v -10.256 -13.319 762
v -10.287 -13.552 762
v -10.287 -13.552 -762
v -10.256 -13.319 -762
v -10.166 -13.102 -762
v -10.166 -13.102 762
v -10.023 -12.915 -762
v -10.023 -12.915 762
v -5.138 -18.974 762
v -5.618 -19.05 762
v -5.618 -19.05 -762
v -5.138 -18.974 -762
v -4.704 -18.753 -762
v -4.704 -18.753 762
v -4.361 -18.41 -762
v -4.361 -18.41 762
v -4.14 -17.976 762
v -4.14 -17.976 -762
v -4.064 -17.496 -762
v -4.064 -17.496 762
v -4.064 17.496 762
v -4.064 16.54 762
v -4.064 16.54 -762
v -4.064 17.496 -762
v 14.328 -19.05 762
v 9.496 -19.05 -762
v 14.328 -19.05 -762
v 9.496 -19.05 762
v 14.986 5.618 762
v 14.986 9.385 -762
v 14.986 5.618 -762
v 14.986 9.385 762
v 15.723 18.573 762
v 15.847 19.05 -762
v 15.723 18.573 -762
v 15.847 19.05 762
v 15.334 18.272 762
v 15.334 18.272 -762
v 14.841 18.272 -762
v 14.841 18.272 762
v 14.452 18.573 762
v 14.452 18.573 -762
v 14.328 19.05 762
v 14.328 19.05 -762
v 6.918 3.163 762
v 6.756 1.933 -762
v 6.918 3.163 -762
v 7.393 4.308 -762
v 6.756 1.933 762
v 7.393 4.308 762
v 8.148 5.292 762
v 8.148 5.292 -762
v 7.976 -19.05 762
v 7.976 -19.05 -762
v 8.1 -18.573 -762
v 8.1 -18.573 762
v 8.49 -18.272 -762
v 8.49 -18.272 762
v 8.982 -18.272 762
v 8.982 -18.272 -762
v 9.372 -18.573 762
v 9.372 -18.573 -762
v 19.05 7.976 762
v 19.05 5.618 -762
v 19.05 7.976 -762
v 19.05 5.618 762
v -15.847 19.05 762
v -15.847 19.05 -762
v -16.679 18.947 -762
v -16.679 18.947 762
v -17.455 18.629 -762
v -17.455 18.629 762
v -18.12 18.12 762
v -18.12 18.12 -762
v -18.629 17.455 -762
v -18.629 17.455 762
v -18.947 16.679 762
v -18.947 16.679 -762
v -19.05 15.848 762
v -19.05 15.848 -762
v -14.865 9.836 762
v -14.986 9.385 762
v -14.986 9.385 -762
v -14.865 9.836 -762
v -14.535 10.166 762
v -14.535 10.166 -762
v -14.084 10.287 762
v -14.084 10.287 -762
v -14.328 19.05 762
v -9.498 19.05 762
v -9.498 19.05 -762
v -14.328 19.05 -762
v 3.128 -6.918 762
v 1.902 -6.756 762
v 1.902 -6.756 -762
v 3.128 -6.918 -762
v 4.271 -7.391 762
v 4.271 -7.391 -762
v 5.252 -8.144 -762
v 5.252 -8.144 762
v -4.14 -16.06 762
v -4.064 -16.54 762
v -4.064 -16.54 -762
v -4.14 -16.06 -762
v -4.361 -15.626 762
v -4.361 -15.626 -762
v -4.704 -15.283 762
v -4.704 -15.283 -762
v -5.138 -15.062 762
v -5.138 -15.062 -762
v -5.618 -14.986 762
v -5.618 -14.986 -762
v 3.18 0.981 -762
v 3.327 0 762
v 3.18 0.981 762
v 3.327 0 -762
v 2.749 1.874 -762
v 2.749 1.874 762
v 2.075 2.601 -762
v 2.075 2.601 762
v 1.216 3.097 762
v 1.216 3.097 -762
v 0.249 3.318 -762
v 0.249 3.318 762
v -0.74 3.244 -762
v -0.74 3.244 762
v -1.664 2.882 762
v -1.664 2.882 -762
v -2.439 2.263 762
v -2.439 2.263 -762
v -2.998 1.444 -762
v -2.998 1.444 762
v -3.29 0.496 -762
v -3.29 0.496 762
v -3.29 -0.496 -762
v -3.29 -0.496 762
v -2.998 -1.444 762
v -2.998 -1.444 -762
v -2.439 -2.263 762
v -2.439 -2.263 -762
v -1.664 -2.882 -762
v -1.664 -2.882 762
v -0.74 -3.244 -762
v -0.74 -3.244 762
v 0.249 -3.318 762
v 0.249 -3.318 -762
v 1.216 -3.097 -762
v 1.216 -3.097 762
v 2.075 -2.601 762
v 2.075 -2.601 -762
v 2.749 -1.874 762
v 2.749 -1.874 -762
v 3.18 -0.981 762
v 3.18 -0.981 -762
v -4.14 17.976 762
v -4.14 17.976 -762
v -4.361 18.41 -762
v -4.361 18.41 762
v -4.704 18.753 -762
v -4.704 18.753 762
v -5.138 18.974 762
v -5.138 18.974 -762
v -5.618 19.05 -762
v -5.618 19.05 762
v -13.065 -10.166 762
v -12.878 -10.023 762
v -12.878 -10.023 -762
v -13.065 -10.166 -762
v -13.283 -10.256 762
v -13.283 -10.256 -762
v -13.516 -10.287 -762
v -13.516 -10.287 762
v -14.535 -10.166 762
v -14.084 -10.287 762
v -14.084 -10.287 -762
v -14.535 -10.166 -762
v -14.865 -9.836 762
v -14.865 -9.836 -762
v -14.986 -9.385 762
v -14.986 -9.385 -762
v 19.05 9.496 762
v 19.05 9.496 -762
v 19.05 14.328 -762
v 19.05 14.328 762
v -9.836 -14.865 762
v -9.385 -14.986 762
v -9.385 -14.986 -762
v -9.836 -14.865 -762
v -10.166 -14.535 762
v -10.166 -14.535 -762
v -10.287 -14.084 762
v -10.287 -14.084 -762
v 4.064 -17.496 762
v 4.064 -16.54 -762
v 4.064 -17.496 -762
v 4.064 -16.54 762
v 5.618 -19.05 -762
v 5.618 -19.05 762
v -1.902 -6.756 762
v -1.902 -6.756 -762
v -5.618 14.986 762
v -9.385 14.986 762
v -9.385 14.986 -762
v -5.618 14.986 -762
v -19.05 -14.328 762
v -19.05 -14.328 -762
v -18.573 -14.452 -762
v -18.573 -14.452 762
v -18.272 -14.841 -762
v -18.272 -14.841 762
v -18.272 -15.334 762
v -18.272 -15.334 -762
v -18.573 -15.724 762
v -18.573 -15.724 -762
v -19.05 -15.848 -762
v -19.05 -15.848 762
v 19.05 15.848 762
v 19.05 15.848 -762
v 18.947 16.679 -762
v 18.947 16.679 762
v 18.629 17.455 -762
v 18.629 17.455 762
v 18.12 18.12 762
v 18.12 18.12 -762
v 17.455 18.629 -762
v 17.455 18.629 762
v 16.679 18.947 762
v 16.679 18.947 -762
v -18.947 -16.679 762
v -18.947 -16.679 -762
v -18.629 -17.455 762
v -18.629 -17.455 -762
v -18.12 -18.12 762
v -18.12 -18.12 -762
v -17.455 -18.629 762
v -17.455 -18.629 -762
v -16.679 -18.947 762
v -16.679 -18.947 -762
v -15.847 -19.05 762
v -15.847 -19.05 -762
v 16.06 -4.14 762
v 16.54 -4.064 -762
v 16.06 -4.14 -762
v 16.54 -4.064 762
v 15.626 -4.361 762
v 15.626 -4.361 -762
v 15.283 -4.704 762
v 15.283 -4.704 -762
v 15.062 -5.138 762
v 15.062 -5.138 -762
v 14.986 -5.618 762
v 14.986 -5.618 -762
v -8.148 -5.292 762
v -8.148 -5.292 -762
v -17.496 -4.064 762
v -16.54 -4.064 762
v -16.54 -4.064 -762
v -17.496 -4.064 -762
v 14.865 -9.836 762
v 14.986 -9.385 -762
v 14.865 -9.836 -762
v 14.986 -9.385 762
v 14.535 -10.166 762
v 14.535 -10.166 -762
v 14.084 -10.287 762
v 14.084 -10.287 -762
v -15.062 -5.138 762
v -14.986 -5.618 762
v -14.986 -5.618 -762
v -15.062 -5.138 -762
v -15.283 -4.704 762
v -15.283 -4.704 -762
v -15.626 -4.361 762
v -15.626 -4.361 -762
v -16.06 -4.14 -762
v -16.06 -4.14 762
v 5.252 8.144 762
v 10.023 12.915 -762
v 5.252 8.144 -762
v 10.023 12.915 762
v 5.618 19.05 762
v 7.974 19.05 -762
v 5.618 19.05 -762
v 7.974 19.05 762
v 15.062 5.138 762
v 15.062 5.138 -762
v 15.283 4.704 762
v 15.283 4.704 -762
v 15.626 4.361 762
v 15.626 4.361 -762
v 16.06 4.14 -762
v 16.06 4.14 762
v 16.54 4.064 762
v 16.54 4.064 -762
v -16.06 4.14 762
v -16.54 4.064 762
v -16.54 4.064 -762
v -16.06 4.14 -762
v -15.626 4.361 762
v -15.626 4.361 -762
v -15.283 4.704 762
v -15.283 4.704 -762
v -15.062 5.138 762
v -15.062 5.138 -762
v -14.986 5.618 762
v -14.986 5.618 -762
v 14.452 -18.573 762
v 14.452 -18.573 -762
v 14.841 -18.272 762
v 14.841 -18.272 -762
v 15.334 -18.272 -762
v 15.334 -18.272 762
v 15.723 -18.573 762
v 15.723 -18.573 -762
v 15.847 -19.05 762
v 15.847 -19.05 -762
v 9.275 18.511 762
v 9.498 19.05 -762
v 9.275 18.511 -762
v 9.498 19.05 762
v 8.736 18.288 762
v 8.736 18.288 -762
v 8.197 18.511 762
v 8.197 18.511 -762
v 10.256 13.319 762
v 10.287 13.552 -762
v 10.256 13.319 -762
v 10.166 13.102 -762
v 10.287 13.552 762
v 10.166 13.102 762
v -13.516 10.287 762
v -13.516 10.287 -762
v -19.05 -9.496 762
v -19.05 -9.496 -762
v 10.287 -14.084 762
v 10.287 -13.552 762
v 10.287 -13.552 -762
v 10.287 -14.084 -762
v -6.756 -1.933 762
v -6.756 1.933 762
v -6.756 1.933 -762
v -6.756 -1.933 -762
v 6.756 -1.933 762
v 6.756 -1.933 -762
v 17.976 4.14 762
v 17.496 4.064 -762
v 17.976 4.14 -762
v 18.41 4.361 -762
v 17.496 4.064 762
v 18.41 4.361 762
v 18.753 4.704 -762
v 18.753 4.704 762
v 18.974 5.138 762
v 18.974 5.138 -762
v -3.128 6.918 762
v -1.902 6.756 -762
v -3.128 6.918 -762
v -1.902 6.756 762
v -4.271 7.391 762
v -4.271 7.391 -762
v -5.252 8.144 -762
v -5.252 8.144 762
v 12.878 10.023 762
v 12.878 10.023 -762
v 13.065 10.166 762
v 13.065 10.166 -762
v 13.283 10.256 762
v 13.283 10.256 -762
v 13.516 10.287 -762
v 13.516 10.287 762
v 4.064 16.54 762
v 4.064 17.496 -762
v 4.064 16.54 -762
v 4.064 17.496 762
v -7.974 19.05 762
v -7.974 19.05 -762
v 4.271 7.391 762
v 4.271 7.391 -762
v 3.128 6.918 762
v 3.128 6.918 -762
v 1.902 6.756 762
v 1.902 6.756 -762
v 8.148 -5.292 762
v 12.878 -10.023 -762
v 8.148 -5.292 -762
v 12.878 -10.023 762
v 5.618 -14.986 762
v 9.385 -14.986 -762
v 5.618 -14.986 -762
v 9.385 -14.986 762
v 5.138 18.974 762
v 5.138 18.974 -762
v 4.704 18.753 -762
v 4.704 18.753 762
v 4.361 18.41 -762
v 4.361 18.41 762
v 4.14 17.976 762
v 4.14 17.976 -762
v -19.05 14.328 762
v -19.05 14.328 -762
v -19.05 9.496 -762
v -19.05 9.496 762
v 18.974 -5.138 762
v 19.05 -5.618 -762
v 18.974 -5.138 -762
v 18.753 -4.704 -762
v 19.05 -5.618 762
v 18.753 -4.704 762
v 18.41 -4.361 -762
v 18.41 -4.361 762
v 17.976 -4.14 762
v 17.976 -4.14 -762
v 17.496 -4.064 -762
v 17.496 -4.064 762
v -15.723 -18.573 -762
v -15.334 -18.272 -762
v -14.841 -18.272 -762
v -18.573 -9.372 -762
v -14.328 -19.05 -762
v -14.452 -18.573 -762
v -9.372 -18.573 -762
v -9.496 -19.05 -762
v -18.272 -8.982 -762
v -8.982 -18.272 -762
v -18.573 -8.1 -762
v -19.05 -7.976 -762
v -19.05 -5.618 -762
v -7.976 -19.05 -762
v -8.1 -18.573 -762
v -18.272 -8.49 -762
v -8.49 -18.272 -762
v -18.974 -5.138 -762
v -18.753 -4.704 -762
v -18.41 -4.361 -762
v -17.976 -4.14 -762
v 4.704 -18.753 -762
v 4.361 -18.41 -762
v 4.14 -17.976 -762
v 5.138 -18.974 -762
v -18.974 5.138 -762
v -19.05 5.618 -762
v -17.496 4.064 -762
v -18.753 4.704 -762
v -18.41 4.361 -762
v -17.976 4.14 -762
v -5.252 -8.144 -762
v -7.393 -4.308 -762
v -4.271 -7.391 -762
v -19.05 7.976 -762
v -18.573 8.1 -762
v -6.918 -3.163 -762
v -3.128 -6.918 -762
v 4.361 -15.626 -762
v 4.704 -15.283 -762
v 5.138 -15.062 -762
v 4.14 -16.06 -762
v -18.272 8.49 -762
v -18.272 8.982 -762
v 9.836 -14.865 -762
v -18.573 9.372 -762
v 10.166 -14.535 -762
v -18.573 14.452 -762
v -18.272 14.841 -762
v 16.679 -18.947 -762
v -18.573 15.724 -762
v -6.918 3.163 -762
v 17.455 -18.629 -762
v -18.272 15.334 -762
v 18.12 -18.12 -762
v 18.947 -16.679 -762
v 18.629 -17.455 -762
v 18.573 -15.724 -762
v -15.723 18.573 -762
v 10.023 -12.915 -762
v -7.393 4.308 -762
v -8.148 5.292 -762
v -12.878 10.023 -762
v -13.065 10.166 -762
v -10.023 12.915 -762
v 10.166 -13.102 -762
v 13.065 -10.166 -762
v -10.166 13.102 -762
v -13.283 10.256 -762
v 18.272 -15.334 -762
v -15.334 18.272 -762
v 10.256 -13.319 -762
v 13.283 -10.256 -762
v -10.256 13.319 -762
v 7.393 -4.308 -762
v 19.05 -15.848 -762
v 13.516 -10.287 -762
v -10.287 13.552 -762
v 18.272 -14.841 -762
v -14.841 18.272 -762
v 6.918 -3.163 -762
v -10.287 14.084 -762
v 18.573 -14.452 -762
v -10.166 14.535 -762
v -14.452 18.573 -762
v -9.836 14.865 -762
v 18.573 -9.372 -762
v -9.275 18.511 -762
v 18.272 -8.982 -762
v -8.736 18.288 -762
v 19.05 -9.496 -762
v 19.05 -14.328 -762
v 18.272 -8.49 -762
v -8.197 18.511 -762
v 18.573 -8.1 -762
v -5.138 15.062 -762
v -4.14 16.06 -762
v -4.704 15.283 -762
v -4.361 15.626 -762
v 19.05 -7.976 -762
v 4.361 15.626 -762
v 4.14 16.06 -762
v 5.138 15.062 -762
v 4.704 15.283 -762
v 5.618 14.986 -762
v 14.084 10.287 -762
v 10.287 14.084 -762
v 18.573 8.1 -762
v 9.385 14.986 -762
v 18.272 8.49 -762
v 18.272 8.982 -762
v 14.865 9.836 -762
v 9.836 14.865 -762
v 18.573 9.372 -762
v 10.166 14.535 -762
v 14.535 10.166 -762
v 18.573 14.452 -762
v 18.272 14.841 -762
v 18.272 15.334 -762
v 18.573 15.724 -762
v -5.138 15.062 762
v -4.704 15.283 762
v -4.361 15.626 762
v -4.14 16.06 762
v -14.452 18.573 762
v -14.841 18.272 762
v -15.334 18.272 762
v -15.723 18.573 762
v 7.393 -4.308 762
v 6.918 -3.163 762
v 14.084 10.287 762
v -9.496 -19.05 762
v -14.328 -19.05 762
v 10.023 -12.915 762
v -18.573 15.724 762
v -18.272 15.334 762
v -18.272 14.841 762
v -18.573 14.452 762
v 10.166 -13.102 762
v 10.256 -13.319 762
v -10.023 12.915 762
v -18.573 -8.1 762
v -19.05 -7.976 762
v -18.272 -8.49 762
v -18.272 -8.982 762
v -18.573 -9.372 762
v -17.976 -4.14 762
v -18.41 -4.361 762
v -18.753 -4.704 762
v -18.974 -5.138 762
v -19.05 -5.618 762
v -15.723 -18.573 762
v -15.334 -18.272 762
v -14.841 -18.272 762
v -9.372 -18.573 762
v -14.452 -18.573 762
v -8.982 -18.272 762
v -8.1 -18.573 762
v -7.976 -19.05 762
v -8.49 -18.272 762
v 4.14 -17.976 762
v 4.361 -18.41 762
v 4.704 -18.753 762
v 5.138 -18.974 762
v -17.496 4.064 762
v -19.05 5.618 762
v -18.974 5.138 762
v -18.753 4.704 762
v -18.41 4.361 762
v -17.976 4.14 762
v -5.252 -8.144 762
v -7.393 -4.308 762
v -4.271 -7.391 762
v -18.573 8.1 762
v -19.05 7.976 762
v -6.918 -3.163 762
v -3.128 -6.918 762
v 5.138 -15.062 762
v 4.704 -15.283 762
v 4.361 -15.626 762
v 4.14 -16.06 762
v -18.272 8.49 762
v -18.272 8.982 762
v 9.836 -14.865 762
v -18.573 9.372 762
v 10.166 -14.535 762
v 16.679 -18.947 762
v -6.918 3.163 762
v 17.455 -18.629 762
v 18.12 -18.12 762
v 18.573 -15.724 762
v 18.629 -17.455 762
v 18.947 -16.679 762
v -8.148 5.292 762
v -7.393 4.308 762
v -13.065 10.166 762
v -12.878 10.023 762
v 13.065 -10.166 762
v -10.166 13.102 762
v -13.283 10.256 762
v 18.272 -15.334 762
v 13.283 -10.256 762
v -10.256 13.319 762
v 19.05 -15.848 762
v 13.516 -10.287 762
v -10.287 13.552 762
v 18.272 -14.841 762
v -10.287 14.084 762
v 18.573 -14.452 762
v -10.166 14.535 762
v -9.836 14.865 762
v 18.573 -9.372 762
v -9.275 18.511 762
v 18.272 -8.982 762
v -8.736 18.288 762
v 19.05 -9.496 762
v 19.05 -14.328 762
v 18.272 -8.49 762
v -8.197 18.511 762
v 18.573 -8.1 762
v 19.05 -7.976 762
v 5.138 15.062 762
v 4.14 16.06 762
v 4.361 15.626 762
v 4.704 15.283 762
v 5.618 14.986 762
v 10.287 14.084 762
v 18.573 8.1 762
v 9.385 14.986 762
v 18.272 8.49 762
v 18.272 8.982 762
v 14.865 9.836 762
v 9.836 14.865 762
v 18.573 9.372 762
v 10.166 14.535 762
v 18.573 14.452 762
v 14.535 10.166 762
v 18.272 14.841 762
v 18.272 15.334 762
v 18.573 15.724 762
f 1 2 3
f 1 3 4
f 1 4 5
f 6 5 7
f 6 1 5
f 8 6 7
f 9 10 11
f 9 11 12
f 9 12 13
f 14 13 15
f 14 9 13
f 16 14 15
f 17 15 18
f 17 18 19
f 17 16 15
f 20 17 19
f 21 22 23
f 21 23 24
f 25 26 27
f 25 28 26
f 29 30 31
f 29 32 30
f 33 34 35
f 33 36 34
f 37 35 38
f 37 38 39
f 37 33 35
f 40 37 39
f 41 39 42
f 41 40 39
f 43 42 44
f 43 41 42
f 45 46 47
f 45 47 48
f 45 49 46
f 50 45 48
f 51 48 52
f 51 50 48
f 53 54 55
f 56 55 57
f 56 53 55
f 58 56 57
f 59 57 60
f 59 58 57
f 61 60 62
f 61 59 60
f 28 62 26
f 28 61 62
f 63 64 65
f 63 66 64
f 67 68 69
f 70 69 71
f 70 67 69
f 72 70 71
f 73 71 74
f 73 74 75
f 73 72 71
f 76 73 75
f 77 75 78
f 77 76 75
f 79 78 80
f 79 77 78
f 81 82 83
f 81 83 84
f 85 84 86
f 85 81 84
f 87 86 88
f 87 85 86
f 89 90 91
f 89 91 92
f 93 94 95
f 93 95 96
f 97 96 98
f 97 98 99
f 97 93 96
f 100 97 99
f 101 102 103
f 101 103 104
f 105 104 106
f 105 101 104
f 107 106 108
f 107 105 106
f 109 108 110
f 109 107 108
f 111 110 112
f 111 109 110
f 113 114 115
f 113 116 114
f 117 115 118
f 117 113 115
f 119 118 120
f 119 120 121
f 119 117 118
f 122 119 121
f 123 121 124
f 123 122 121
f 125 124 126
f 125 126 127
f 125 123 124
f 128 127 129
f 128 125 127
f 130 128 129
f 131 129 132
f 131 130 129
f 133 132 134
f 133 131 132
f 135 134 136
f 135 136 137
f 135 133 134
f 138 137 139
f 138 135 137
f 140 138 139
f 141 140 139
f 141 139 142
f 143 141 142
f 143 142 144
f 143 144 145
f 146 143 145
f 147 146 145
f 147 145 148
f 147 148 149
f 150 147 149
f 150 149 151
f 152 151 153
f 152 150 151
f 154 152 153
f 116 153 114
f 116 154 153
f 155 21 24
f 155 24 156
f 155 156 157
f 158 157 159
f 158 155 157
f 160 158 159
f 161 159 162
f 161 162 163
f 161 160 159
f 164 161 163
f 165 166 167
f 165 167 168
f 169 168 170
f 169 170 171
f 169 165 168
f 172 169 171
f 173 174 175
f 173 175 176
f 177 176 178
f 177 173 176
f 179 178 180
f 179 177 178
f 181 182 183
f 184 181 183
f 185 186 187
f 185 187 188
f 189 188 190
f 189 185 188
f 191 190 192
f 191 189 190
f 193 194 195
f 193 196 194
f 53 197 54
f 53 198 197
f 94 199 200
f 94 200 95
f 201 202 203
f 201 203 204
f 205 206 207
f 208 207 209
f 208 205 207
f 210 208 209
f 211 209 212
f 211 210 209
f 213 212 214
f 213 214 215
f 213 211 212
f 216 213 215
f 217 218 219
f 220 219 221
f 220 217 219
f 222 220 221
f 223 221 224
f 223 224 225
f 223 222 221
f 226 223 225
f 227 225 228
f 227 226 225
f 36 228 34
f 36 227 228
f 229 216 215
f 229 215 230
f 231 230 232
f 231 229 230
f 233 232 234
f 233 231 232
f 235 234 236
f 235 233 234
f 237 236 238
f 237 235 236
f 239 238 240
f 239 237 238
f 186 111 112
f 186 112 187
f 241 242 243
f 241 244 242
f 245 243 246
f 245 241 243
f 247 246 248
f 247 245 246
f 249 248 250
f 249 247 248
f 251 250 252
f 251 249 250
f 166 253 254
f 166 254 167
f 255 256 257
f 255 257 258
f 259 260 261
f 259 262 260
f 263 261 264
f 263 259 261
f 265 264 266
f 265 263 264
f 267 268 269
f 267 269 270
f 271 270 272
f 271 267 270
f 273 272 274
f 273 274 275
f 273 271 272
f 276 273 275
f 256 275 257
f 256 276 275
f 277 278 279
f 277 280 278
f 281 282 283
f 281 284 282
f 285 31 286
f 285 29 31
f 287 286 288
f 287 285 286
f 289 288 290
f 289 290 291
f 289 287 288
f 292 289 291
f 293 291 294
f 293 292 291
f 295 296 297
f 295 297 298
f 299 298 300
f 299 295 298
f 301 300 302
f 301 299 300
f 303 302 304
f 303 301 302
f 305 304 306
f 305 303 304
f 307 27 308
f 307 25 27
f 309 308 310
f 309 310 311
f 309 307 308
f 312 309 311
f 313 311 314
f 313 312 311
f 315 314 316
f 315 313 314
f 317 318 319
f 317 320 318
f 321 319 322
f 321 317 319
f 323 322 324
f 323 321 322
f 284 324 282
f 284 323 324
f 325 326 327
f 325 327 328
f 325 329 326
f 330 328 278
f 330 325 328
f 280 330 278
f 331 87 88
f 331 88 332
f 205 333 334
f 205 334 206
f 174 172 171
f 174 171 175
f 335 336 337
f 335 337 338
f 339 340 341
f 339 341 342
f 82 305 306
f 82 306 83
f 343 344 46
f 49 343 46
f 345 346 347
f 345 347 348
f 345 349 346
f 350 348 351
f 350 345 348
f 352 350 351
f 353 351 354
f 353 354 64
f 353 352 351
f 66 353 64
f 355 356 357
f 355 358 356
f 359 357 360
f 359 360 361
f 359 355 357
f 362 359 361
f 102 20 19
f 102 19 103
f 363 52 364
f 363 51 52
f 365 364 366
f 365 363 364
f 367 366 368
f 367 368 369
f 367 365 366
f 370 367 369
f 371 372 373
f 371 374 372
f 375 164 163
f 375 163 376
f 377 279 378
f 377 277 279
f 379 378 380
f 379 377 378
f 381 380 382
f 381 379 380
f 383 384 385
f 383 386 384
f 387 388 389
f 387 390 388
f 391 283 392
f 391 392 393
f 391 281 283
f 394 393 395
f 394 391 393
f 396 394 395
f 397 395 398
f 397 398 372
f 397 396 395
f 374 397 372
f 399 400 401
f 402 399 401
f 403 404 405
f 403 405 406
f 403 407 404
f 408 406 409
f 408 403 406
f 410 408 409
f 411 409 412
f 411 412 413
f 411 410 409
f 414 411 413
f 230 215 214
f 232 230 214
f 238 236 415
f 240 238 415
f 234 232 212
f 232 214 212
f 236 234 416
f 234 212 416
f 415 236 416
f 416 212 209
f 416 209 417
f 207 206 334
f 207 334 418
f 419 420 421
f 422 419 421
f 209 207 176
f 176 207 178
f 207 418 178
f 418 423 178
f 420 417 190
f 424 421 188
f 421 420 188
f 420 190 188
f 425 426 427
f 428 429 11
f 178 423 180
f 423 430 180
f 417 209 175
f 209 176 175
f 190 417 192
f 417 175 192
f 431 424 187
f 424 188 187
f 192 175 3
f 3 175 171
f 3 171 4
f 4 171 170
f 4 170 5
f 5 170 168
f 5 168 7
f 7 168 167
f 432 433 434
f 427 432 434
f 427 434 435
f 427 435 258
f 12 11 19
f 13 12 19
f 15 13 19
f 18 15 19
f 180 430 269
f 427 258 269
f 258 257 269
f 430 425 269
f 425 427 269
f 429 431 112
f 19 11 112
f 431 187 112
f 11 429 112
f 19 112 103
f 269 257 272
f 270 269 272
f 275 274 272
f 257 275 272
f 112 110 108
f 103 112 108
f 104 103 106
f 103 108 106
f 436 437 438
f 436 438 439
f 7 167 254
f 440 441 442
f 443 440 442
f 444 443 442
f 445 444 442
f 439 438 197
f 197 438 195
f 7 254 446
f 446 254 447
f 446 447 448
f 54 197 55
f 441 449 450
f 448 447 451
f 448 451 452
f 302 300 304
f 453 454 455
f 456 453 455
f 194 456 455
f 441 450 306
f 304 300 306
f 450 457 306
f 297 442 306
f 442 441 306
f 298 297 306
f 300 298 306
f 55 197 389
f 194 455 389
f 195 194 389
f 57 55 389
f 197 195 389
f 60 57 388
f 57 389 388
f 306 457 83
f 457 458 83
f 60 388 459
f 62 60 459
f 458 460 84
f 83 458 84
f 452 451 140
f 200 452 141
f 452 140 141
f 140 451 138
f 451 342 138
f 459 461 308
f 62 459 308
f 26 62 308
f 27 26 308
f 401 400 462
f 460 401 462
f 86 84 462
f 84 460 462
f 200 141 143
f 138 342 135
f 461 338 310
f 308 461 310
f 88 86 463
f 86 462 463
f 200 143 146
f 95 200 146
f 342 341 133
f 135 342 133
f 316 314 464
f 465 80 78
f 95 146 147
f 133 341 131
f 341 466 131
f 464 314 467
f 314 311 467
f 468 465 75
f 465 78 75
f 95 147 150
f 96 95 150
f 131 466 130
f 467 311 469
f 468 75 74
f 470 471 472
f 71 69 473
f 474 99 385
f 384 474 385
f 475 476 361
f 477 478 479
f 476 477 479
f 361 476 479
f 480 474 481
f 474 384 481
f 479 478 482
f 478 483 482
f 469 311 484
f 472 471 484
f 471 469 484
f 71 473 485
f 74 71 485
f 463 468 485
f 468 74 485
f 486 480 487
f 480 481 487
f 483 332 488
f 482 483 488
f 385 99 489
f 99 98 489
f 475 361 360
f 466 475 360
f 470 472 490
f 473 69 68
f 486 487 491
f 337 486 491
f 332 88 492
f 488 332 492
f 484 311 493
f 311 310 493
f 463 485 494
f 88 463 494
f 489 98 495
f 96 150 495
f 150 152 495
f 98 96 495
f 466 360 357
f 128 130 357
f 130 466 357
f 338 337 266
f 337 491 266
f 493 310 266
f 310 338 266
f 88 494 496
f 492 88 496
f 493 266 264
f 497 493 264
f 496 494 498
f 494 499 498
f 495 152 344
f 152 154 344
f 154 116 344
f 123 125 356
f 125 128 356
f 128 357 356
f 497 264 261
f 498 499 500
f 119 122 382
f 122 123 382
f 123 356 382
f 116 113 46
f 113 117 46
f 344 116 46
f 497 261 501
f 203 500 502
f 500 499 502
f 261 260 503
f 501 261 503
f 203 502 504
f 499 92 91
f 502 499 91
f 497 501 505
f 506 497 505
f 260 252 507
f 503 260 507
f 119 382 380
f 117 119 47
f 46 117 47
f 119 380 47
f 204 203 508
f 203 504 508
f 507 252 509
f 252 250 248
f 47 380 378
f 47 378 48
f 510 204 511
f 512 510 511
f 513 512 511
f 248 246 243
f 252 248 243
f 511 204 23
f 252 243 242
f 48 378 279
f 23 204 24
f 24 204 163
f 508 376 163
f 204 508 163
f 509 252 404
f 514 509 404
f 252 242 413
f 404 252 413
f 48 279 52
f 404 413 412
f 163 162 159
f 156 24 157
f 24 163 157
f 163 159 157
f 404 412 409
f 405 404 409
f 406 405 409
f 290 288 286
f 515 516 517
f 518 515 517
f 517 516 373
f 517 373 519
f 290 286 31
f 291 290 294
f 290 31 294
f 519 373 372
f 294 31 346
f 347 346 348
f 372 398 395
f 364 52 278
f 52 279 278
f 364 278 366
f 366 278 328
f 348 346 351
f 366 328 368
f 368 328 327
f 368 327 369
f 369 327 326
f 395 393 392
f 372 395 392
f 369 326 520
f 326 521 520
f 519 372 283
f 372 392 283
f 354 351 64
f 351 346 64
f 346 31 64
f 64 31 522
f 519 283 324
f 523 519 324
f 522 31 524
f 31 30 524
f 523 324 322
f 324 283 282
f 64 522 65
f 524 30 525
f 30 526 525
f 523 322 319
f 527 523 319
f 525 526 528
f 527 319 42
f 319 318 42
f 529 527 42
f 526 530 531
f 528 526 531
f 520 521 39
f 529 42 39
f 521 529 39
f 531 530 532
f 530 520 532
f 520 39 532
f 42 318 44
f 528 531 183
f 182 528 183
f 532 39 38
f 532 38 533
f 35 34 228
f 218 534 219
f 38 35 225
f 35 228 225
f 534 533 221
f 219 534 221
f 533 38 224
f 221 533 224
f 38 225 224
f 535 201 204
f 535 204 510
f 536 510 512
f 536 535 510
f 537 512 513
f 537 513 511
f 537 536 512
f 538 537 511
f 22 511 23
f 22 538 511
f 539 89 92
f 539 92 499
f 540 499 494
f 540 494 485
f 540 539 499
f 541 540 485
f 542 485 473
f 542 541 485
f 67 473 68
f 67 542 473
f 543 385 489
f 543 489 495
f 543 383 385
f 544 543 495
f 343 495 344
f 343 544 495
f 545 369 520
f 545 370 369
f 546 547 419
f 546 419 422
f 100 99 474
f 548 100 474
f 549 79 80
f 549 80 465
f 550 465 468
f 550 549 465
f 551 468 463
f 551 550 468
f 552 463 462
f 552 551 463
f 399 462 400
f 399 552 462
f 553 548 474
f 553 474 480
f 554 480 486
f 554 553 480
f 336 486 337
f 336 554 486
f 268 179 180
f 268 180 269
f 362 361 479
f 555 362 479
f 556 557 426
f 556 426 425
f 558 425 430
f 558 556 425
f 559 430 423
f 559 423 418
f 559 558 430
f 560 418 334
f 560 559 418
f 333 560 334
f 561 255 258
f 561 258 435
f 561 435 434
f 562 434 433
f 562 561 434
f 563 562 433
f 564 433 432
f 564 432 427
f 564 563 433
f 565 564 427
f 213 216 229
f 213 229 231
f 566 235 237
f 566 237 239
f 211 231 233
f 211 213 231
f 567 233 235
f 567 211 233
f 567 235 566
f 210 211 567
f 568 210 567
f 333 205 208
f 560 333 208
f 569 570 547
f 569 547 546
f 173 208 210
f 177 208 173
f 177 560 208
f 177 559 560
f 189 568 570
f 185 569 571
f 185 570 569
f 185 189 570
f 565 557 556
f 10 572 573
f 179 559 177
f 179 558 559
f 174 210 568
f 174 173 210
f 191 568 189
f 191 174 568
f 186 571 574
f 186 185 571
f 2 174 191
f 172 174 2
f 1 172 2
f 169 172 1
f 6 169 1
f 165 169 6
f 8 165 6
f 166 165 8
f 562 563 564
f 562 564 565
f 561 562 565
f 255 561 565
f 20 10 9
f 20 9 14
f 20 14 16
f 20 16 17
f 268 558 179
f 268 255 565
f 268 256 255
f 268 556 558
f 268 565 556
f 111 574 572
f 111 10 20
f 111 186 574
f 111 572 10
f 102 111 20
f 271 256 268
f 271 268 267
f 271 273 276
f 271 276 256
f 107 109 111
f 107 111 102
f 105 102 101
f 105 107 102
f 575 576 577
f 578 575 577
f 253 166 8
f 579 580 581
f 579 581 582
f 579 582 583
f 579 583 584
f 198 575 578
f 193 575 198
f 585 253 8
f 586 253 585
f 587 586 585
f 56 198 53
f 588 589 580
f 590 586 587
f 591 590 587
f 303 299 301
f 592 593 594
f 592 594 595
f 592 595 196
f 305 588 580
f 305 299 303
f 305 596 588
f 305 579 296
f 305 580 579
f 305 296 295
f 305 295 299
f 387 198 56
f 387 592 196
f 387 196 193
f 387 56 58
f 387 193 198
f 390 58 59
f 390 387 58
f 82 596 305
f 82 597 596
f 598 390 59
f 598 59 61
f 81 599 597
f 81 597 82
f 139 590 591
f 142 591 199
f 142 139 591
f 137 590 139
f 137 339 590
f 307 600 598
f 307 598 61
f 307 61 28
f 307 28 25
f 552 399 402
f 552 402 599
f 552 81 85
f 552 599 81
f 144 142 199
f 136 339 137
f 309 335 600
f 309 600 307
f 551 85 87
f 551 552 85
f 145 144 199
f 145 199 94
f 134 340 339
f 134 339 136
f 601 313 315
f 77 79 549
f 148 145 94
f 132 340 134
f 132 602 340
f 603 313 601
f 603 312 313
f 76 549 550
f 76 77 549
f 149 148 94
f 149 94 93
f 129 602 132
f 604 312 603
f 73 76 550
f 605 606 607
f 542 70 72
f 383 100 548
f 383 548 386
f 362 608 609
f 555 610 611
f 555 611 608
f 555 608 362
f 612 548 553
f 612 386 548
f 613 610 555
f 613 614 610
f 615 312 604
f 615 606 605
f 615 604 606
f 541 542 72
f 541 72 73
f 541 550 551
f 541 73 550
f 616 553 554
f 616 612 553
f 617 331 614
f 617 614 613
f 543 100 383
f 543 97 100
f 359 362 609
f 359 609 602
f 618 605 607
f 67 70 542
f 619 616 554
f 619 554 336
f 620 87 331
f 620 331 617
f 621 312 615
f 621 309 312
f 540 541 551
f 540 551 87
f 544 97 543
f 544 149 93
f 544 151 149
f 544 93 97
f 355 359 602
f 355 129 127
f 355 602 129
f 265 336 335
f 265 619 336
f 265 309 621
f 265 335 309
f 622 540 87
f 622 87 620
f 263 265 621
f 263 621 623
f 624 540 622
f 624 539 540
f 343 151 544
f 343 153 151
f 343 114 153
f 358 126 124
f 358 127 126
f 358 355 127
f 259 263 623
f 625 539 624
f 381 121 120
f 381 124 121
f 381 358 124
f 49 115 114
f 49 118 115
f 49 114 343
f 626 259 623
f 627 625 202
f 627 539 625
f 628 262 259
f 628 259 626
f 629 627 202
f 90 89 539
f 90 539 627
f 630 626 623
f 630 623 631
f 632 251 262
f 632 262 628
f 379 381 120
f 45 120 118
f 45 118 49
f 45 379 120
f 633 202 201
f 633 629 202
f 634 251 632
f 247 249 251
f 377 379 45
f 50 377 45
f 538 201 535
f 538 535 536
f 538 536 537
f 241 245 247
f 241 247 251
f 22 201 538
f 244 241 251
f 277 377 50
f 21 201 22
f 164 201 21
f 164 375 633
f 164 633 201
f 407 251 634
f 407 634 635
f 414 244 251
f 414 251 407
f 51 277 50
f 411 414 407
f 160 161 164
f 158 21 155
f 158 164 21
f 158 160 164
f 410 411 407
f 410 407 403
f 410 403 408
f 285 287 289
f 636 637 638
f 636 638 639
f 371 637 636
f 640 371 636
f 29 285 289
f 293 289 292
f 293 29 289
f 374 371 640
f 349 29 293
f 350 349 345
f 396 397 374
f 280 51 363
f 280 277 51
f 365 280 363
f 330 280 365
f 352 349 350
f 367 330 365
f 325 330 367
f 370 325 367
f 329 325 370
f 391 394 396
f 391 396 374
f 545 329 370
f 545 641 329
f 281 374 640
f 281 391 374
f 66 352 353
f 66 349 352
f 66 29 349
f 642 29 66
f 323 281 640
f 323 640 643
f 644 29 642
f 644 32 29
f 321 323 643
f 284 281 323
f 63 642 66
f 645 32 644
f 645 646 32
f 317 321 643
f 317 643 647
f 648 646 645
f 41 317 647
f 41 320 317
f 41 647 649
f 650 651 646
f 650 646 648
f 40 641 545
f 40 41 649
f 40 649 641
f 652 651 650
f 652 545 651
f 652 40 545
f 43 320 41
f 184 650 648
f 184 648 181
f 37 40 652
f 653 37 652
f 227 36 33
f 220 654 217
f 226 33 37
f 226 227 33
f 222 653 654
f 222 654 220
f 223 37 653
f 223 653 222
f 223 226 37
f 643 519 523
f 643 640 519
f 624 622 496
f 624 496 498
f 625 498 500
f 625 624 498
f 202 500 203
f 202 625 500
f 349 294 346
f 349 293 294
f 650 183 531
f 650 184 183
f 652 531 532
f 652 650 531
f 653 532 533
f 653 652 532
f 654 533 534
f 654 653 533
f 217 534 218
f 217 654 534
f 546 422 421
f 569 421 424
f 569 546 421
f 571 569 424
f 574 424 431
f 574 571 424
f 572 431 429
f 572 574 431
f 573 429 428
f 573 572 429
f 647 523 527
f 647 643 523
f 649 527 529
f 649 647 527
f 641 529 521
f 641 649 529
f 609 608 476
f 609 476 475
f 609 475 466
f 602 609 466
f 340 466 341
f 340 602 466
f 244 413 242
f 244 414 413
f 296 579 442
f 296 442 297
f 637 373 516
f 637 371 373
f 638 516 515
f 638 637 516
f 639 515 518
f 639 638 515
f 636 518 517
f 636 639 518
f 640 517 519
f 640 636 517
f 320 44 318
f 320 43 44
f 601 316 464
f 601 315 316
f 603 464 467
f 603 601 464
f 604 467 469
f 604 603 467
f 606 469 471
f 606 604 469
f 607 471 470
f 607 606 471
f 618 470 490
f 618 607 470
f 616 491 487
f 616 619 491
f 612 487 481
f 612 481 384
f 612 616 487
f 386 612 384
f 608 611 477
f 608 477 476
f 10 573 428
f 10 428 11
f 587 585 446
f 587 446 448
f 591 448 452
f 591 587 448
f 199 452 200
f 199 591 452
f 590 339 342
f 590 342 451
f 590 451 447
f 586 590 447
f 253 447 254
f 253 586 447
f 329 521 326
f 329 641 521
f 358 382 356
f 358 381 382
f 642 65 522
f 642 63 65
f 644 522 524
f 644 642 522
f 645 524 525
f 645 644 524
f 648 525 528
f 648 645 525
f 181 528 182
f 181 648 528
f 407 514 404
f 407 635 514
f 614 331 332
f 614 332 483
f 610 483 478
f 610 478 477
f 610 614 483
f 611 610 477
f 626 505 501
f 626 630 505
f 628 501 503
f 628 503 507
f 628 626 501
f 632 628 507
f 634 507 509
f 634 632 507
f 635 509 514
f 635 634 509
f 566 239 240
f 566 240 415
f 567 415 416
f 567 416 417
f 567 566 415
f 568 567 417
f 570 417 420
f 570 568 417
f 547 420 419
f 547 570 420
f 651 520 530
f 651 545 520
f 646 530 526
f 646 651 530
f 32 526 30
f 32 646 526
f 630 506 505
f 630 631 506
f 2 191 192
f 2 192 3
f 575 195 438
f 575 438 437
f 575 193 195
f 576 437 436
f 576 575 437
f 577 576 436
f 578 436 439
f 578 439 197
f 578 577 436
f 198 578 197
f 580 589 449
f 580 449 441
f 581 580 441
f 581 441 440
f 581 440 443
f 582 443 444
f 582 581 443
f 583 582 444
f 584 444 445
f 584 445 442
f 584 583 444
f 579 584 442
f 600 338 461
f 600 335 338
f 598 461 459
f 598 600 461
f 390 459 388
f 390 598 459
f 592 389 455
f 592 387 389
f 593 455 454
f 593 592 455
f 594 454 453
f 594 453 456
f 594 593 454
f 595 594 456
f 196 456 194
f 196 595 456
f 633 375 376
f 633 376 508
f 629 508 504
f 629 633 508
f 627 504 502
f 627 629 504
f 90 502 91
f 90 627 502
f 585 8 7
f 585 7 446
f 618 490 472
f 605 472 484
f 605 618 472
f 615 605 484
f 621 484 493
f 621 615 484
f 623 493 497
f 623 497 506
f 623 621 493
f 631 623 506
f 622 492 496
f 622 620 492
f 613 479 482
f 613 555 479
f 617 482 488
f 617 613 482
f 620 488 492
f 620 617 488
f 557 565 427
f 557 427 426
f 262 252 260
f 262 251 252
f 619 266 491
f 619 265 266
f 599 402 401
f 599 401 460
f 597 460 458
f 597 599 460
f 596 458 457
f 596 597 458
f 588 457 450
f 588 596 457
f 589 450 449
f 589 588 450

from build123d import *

# Parameters (mm, degrees)
SKETCH1_R           = 3.3274
BOSS_EXTRUDE1_DEPTH = 762


with BuildPart() as part:
    # Sketch1 → Boss-Extrude1 (new, symmetric)
    with BuildSketch(Plane.XY):
        with BuildLine():
            Line((-10.287, 13.552357131), (-10.287, 14.0843))
            ThreePointArc((-10.287, 14.0843), (-10.022898185, 14.721898185), (-9.3853, 14.986))
            Line((-9.3853, 14.986), (-5.617617549, 14.986))
            ThreePointArc((-5.617617549, 14.986), (-4.519044045, 15.441044045), (-4.064, 16.539617549))
            Line((-4.064, 16.539617549), (-4.064, 17.496382451))
            ThreePointArc((-4.064, 17.496382451), (-4.519044045, 18.594955955), (-5.617617549, 19.05))
            Line((-5.617617549, 19.05), (-7.974178704, 19.05))
            ThreePointArc((-7.974178704, 19.05), (-8.736178704, 18.288), (-9.498178704, 19.05))
            Line((-9.498178704, 19.05), (-14.327719207, 19.05))
            ThreePointArc((-14.327719207, 19.05), (-15.087603123, 18.231251131), (-15.847487039, 19.05))
            ThreePointArc((-15.847487039, 19.05), (-18.120176289, 18.120192083), (-19.05, 15.847509295))
            ThreePointArc((-19.05, 15.847509295), (-18.231250992, 15.08762539), (-19.05, 14.327741484))
            Line((-19.05, 14.327741484), (-19.05, 9.496091471))
            ThreePointArc((-19.05, 9.496091471), (-18.231250992, 8.736207565), (-19.05, 7.97632366))
            Line((-19.05, 7.97632366), (-19.05, 5.617617549))
            ThreePointArc((-19.05, 5.617617549), (-18.594955955, 4.519044045), (-17.496382451, 4.064))
            Line((-17.496382451, 4.064), (-16.539617549, 4.064))
            ThreePointArc((-16.539617549, 4.064), (-15.441044045, 4.519044045), (-14.986, 5.617617549))
            Line((-14.986, 5.617617549), (-14.986, 9.385342516))
            ThreePointArc((-14.986, 9.385342516), (-14.721898185, 10.022940701), (-14.0843, 10.287042516))
            Line((-14.0843, 10.287042516), (-13.516042086, 10.287042516))
            ThreePointArc((-13.516042086, 10.287042516), (-13.170975923, 10.218404478), (-12.878443117, 10.022939917))
            Line((-12.878443117, 10.022939917), (-8.14758008, 5.292065243))
            ThreePointArc((-8.14758008, 5.292065243), (-7.117955879, 3.751120653), (-6.7564, 1.933453584))
            Line((-6.7564, 1.933453584), (-6.7564, -1.933453584))
            ThreePointArc((-6.7564, -1.933453584), (-7.117955879, -3.751120653), (-8.14758008, -5.292065243))
            Line((-8.14758008, -5.292065243), (-12.878443117, -10.022939917))
            ThreePointArc((-12.878443117, -10.022939917), (-13.170975923, -10.218404478), (-13.516042086, -10.287042516))
            Line((-13.516042086, -10.287042516), (-14.0843, -10.287042516))
            ThreePointArc((-14.0843, -10.287042516), (-14.721898185, -10.022940701), (-14.986, -9.385342516))
            Line((-14.986, -9.385342516), (-14.986, -5.617617549))
            ThreePointArc((-14.986, -5.617617549), (-15.441044045, -4.519044045), (-16.539617549, -4.064))
            Line((-16.539617549, -4.064), (-17.496382451, -4.064))
            ThreePointArc((-17.496382451, -4.064), (-18.594955955, -4.519044045), (-19.05, -5.617617549))
            Line((-19.05, -5.617617549), (-19.05, -7.976318491))
            ThreePointArc((-19.05, -7.976318491), (-18.231250992, -8.736202396), (-19.05, -9.496086302))
            Line((-19.05, -9.496086302), (-19.05, -14.32774291))
            ThreePointArc((-19.05, -14.32774291), (-18.231250992, -15.087626816), (-19.05, -15.847510721))
            ThreePointArc((-19.05, -15.847510721), (-18.120175716, -18.120192644), (-15.847486868, -19.05))
            ThreePointArc((-15.847486868, -19.05), (-15.087602952, -18.231251131), (-14.327719036, -19.05))
            Line((-14.327719036, -19.05), (-9.496062448, -19.05))
            ThreePointArc((-9.496062448, -19.05), (-8.736178532, -18.231251131), (-7.976294616, -19.05))
            Line((-7.976294616, -19.05), (-5.617617549, -19.05))
            ThreePointArc((-5.617617549, -19.05), (-4.519044045, -18.594955955), (-4.064, -17.496382451))
            Line((-4.064, -17.496382451), (-4.064, -16.539617549))
            ThreePointArc((-4.064, -16.539617549), (-4.519044045, -15.441044045), (-5.617617549, -14.986))
            Line((-5.617617549, -14.986), (-9.3853, -14.986))
            ThreePointArc((-9.3853, -14.986), (-10.022898185, -14.721898185), (-10.287, -14.0843))
            Line((-10.287, -14.0843), (-10.287, -13.552357131))
            ThreePointArc((-10.287, -13.552357131), (-10.218362387, -13.207291992), (-10.022898969, -12.91475973))
            Line((-10.022898969, -12.91475973), (-5.252158105, -8.144007132))
            ThreePointArc((-5.252158105, -8.144007132), (-3.715177372, -7.117027388), (-1.902183975, -6.7564))
            Line((-1.902183975, -6.7564), (1.902183975, -6.7564))
            ThreePointArc((1.902183975, -6.7564), (3.715177372, -7.117027388), (5.252158105, -8.144007132))
            Line((5.252158105, -8.144007132), (10.022898969, -12.91475973))
            ThreePointArc((10.022898969, -12.91475973), (10.218362387, -13.207291992), (10.287, -13.552357131))
            Line((10.287, -13.552357131), (10.287, -14.0843))
            ThreePointArc((10.287, -14.0843), (10.022898185, -14.721898185), (9.3853, -14.986))
            Line((9.3853, -14.986), (5.617617549, -14.986))
            ThreePointArc((5.617617549, -14.986), (4.519044045, -15.441044045), (4.064, -16.539617549))
            Line((4.064, -16.539617549), (4.064, -17.496382451))
            ThreePointArc((4.064, -17.496382451), (4.519044045, -18.594955955), (5.617617549, -19.05))
            Line((5.617617549, -19.05), (7.976294616, -19.05))
            ThreePointArc((7.976294616, -19.05), (8.736178532, -18.231251131), (9.496062448, -19.05))
            Line((9.496062448, -19.05), (14.327719036, -19.05))
            ThreePointArc((14.327719036, -19.05), (15.087602952, -18.231251131), (15.847486868, -19.05))
            ThreePointArc((15.847486868, -19.05), (18.120175716, -18.120192644), (19.05, -15.847510721))
            ThreePointArc((19.05, -15.847510721), (18.231250992, -15.087626816), (19.05, -14.32774291))
            Line((19.05, -14.32774291), (19.05, -9.496086302))
            ThreePointArc((19.05, -9.496086302), (18.231250992, -8.736202396), (19.05, -7.976318491))
            Line((19.05, -7.976318491), (19.05, -5.617617549))
            ThreePointArc((19.05, -5.617617549), (18.594955955, -4.519044045), (17.496382451, -4.064))
            Line((17.496382451, -4.064), (16.539617549, -4.064))
            ThreePointArc((16.539617549, -4.064), (15.441044045, -4.519044045), (14.986, -5.617617549))
            Line((14.986, -5.617617549), (14.986, -9.385342516))
            ThreePointArc((14.986, -9.385342516), (14.721898185, -10.022940701), (14.0843, -10.287042516))
            Line((14.0843, -10.287042516), (13.516042086, -10.287042516))
            ThreePointArc((13.516042086, -10.287042516), (13.170975923, -10.218404478), (12.878443117, -10.022939917))
            Line((12.878443117, -10.022939917), (8.14758008, -5.292065243))
            ThreePointArc((8.14758008, -5.292065243), (7.117955879, -3.751120653), (6.7564, -1.933453584))
            Line((6.7564, -1.933453584), (6.7564, 1.933453584))
            ThreePointArc((6.7564, 1.933453584), (7.117955879, 3.751120653), (8.14758008, 5.292065243))
            Line((8.14758008, 5.292065243), (12.878443117, 10.022939917))
            ThreePointArc((12.878443117, 10.022939917), (13.170975923, 10.218404478), (13.516042086, 10.287042516))
            Line((13.516042086, 10.287042516), (14.0843, 10.287042516))
            ThreePointArc((14.0843, 10.287042516), (14.721898185, 10.022940701), (14.986, 9.385342516))
            Line((14.986, 9.385342516), (14.986, 5.617617549))
            ThreePointArc((14.986, 5.617617549), (15.441044045, 4.519044045), (16.539617549, 4.064))
            Line((16.539617549, 4.064), (17.496382451, 4.064))
            ThreePointArc((17.496382451, 4.064), (18.594955955, 4.519044045), (19.05, 5.617617549))
            Line((19.05, 5.617617549), (19.05, 7.97632366))
            ThreePointArc((19.05, 7.97632366), (18.231250992, 8.736207565), (19.05, 9.496091471))
            Line((19.05, 9.496091471), (19.05, 14.327741484))
            ThreePointArc((19.05, 14.327741484), (18.231250992, 15.08762539), (19.05, 15.847509295))
            ThreePointArc((19.05, 15.847509295), (18.120176289, 18.120192083), (15.847487039, 19.05))
            ThreePointArc((15.847487039, 19.05), (15.087603123, 18.231251131), (14.327719207, 19.05))
            Line((14.327719207, 19.05), (9.498178704, 19.05))
            ThreePointArc((9.498178704, 19.05), (8.736178704, 18.288), (7.974178704, 19.05))
            Line((7.974178704, 19.05), (5.617617549, 19.05))
            ThreePointArc((5.617617549, 19.05), (4.519044045, 18.594955955), (4.064, 17.496382451))
            Line((4.064, 17.496382451), (4.064, 16.539617549))
            ThreePointArc((4.064, 16.539617549), (4.519044045, 15.441044045), (5.617617549, 14.986))
            Line((5.617617549, 14.986), (9.3853, 14.986))
            ThreePointArc((9.3853, 14.986), (10.022898185, 14.721898185), (10.287, 14.0843))
            Line((10.287, 14.0843), (10.287, 13.552357131))
            ThreePointArc((10.287, 13.552357131), (10.218362387, 13.207291992), (10.022898969, 12.91475973))
            Line((10.022898969, 12.91475973), (5.252158105, 8.144007132))
            ThreePointArc((5.252158105, 8.144007132), (3.715177372, 7.117027388), (1.902183975, 6.7564))
            Line((1.902183975, 6.7564), (-1.902183975, 6.7564))
            ThreePointArc((-1.902183975, 6.7564), (-3.715177372, 7.117027388), (-5.252158105, 8.144007132))
            Line((-5.252158105, 8.144007132), (-10.022898969, 12.91475973))
            ThreePointArc((-10.022898969, 12.91475973), (-10.218362387, 13.207291992), (-10.287, 13.552357131))
        make_face()
        Circle(SKETCH1_R, mode=Mode.SUBTRACT)
    extrude(amount=BOSS_EXTRUDE1_DEPTH, both=True)


solid = part.part
